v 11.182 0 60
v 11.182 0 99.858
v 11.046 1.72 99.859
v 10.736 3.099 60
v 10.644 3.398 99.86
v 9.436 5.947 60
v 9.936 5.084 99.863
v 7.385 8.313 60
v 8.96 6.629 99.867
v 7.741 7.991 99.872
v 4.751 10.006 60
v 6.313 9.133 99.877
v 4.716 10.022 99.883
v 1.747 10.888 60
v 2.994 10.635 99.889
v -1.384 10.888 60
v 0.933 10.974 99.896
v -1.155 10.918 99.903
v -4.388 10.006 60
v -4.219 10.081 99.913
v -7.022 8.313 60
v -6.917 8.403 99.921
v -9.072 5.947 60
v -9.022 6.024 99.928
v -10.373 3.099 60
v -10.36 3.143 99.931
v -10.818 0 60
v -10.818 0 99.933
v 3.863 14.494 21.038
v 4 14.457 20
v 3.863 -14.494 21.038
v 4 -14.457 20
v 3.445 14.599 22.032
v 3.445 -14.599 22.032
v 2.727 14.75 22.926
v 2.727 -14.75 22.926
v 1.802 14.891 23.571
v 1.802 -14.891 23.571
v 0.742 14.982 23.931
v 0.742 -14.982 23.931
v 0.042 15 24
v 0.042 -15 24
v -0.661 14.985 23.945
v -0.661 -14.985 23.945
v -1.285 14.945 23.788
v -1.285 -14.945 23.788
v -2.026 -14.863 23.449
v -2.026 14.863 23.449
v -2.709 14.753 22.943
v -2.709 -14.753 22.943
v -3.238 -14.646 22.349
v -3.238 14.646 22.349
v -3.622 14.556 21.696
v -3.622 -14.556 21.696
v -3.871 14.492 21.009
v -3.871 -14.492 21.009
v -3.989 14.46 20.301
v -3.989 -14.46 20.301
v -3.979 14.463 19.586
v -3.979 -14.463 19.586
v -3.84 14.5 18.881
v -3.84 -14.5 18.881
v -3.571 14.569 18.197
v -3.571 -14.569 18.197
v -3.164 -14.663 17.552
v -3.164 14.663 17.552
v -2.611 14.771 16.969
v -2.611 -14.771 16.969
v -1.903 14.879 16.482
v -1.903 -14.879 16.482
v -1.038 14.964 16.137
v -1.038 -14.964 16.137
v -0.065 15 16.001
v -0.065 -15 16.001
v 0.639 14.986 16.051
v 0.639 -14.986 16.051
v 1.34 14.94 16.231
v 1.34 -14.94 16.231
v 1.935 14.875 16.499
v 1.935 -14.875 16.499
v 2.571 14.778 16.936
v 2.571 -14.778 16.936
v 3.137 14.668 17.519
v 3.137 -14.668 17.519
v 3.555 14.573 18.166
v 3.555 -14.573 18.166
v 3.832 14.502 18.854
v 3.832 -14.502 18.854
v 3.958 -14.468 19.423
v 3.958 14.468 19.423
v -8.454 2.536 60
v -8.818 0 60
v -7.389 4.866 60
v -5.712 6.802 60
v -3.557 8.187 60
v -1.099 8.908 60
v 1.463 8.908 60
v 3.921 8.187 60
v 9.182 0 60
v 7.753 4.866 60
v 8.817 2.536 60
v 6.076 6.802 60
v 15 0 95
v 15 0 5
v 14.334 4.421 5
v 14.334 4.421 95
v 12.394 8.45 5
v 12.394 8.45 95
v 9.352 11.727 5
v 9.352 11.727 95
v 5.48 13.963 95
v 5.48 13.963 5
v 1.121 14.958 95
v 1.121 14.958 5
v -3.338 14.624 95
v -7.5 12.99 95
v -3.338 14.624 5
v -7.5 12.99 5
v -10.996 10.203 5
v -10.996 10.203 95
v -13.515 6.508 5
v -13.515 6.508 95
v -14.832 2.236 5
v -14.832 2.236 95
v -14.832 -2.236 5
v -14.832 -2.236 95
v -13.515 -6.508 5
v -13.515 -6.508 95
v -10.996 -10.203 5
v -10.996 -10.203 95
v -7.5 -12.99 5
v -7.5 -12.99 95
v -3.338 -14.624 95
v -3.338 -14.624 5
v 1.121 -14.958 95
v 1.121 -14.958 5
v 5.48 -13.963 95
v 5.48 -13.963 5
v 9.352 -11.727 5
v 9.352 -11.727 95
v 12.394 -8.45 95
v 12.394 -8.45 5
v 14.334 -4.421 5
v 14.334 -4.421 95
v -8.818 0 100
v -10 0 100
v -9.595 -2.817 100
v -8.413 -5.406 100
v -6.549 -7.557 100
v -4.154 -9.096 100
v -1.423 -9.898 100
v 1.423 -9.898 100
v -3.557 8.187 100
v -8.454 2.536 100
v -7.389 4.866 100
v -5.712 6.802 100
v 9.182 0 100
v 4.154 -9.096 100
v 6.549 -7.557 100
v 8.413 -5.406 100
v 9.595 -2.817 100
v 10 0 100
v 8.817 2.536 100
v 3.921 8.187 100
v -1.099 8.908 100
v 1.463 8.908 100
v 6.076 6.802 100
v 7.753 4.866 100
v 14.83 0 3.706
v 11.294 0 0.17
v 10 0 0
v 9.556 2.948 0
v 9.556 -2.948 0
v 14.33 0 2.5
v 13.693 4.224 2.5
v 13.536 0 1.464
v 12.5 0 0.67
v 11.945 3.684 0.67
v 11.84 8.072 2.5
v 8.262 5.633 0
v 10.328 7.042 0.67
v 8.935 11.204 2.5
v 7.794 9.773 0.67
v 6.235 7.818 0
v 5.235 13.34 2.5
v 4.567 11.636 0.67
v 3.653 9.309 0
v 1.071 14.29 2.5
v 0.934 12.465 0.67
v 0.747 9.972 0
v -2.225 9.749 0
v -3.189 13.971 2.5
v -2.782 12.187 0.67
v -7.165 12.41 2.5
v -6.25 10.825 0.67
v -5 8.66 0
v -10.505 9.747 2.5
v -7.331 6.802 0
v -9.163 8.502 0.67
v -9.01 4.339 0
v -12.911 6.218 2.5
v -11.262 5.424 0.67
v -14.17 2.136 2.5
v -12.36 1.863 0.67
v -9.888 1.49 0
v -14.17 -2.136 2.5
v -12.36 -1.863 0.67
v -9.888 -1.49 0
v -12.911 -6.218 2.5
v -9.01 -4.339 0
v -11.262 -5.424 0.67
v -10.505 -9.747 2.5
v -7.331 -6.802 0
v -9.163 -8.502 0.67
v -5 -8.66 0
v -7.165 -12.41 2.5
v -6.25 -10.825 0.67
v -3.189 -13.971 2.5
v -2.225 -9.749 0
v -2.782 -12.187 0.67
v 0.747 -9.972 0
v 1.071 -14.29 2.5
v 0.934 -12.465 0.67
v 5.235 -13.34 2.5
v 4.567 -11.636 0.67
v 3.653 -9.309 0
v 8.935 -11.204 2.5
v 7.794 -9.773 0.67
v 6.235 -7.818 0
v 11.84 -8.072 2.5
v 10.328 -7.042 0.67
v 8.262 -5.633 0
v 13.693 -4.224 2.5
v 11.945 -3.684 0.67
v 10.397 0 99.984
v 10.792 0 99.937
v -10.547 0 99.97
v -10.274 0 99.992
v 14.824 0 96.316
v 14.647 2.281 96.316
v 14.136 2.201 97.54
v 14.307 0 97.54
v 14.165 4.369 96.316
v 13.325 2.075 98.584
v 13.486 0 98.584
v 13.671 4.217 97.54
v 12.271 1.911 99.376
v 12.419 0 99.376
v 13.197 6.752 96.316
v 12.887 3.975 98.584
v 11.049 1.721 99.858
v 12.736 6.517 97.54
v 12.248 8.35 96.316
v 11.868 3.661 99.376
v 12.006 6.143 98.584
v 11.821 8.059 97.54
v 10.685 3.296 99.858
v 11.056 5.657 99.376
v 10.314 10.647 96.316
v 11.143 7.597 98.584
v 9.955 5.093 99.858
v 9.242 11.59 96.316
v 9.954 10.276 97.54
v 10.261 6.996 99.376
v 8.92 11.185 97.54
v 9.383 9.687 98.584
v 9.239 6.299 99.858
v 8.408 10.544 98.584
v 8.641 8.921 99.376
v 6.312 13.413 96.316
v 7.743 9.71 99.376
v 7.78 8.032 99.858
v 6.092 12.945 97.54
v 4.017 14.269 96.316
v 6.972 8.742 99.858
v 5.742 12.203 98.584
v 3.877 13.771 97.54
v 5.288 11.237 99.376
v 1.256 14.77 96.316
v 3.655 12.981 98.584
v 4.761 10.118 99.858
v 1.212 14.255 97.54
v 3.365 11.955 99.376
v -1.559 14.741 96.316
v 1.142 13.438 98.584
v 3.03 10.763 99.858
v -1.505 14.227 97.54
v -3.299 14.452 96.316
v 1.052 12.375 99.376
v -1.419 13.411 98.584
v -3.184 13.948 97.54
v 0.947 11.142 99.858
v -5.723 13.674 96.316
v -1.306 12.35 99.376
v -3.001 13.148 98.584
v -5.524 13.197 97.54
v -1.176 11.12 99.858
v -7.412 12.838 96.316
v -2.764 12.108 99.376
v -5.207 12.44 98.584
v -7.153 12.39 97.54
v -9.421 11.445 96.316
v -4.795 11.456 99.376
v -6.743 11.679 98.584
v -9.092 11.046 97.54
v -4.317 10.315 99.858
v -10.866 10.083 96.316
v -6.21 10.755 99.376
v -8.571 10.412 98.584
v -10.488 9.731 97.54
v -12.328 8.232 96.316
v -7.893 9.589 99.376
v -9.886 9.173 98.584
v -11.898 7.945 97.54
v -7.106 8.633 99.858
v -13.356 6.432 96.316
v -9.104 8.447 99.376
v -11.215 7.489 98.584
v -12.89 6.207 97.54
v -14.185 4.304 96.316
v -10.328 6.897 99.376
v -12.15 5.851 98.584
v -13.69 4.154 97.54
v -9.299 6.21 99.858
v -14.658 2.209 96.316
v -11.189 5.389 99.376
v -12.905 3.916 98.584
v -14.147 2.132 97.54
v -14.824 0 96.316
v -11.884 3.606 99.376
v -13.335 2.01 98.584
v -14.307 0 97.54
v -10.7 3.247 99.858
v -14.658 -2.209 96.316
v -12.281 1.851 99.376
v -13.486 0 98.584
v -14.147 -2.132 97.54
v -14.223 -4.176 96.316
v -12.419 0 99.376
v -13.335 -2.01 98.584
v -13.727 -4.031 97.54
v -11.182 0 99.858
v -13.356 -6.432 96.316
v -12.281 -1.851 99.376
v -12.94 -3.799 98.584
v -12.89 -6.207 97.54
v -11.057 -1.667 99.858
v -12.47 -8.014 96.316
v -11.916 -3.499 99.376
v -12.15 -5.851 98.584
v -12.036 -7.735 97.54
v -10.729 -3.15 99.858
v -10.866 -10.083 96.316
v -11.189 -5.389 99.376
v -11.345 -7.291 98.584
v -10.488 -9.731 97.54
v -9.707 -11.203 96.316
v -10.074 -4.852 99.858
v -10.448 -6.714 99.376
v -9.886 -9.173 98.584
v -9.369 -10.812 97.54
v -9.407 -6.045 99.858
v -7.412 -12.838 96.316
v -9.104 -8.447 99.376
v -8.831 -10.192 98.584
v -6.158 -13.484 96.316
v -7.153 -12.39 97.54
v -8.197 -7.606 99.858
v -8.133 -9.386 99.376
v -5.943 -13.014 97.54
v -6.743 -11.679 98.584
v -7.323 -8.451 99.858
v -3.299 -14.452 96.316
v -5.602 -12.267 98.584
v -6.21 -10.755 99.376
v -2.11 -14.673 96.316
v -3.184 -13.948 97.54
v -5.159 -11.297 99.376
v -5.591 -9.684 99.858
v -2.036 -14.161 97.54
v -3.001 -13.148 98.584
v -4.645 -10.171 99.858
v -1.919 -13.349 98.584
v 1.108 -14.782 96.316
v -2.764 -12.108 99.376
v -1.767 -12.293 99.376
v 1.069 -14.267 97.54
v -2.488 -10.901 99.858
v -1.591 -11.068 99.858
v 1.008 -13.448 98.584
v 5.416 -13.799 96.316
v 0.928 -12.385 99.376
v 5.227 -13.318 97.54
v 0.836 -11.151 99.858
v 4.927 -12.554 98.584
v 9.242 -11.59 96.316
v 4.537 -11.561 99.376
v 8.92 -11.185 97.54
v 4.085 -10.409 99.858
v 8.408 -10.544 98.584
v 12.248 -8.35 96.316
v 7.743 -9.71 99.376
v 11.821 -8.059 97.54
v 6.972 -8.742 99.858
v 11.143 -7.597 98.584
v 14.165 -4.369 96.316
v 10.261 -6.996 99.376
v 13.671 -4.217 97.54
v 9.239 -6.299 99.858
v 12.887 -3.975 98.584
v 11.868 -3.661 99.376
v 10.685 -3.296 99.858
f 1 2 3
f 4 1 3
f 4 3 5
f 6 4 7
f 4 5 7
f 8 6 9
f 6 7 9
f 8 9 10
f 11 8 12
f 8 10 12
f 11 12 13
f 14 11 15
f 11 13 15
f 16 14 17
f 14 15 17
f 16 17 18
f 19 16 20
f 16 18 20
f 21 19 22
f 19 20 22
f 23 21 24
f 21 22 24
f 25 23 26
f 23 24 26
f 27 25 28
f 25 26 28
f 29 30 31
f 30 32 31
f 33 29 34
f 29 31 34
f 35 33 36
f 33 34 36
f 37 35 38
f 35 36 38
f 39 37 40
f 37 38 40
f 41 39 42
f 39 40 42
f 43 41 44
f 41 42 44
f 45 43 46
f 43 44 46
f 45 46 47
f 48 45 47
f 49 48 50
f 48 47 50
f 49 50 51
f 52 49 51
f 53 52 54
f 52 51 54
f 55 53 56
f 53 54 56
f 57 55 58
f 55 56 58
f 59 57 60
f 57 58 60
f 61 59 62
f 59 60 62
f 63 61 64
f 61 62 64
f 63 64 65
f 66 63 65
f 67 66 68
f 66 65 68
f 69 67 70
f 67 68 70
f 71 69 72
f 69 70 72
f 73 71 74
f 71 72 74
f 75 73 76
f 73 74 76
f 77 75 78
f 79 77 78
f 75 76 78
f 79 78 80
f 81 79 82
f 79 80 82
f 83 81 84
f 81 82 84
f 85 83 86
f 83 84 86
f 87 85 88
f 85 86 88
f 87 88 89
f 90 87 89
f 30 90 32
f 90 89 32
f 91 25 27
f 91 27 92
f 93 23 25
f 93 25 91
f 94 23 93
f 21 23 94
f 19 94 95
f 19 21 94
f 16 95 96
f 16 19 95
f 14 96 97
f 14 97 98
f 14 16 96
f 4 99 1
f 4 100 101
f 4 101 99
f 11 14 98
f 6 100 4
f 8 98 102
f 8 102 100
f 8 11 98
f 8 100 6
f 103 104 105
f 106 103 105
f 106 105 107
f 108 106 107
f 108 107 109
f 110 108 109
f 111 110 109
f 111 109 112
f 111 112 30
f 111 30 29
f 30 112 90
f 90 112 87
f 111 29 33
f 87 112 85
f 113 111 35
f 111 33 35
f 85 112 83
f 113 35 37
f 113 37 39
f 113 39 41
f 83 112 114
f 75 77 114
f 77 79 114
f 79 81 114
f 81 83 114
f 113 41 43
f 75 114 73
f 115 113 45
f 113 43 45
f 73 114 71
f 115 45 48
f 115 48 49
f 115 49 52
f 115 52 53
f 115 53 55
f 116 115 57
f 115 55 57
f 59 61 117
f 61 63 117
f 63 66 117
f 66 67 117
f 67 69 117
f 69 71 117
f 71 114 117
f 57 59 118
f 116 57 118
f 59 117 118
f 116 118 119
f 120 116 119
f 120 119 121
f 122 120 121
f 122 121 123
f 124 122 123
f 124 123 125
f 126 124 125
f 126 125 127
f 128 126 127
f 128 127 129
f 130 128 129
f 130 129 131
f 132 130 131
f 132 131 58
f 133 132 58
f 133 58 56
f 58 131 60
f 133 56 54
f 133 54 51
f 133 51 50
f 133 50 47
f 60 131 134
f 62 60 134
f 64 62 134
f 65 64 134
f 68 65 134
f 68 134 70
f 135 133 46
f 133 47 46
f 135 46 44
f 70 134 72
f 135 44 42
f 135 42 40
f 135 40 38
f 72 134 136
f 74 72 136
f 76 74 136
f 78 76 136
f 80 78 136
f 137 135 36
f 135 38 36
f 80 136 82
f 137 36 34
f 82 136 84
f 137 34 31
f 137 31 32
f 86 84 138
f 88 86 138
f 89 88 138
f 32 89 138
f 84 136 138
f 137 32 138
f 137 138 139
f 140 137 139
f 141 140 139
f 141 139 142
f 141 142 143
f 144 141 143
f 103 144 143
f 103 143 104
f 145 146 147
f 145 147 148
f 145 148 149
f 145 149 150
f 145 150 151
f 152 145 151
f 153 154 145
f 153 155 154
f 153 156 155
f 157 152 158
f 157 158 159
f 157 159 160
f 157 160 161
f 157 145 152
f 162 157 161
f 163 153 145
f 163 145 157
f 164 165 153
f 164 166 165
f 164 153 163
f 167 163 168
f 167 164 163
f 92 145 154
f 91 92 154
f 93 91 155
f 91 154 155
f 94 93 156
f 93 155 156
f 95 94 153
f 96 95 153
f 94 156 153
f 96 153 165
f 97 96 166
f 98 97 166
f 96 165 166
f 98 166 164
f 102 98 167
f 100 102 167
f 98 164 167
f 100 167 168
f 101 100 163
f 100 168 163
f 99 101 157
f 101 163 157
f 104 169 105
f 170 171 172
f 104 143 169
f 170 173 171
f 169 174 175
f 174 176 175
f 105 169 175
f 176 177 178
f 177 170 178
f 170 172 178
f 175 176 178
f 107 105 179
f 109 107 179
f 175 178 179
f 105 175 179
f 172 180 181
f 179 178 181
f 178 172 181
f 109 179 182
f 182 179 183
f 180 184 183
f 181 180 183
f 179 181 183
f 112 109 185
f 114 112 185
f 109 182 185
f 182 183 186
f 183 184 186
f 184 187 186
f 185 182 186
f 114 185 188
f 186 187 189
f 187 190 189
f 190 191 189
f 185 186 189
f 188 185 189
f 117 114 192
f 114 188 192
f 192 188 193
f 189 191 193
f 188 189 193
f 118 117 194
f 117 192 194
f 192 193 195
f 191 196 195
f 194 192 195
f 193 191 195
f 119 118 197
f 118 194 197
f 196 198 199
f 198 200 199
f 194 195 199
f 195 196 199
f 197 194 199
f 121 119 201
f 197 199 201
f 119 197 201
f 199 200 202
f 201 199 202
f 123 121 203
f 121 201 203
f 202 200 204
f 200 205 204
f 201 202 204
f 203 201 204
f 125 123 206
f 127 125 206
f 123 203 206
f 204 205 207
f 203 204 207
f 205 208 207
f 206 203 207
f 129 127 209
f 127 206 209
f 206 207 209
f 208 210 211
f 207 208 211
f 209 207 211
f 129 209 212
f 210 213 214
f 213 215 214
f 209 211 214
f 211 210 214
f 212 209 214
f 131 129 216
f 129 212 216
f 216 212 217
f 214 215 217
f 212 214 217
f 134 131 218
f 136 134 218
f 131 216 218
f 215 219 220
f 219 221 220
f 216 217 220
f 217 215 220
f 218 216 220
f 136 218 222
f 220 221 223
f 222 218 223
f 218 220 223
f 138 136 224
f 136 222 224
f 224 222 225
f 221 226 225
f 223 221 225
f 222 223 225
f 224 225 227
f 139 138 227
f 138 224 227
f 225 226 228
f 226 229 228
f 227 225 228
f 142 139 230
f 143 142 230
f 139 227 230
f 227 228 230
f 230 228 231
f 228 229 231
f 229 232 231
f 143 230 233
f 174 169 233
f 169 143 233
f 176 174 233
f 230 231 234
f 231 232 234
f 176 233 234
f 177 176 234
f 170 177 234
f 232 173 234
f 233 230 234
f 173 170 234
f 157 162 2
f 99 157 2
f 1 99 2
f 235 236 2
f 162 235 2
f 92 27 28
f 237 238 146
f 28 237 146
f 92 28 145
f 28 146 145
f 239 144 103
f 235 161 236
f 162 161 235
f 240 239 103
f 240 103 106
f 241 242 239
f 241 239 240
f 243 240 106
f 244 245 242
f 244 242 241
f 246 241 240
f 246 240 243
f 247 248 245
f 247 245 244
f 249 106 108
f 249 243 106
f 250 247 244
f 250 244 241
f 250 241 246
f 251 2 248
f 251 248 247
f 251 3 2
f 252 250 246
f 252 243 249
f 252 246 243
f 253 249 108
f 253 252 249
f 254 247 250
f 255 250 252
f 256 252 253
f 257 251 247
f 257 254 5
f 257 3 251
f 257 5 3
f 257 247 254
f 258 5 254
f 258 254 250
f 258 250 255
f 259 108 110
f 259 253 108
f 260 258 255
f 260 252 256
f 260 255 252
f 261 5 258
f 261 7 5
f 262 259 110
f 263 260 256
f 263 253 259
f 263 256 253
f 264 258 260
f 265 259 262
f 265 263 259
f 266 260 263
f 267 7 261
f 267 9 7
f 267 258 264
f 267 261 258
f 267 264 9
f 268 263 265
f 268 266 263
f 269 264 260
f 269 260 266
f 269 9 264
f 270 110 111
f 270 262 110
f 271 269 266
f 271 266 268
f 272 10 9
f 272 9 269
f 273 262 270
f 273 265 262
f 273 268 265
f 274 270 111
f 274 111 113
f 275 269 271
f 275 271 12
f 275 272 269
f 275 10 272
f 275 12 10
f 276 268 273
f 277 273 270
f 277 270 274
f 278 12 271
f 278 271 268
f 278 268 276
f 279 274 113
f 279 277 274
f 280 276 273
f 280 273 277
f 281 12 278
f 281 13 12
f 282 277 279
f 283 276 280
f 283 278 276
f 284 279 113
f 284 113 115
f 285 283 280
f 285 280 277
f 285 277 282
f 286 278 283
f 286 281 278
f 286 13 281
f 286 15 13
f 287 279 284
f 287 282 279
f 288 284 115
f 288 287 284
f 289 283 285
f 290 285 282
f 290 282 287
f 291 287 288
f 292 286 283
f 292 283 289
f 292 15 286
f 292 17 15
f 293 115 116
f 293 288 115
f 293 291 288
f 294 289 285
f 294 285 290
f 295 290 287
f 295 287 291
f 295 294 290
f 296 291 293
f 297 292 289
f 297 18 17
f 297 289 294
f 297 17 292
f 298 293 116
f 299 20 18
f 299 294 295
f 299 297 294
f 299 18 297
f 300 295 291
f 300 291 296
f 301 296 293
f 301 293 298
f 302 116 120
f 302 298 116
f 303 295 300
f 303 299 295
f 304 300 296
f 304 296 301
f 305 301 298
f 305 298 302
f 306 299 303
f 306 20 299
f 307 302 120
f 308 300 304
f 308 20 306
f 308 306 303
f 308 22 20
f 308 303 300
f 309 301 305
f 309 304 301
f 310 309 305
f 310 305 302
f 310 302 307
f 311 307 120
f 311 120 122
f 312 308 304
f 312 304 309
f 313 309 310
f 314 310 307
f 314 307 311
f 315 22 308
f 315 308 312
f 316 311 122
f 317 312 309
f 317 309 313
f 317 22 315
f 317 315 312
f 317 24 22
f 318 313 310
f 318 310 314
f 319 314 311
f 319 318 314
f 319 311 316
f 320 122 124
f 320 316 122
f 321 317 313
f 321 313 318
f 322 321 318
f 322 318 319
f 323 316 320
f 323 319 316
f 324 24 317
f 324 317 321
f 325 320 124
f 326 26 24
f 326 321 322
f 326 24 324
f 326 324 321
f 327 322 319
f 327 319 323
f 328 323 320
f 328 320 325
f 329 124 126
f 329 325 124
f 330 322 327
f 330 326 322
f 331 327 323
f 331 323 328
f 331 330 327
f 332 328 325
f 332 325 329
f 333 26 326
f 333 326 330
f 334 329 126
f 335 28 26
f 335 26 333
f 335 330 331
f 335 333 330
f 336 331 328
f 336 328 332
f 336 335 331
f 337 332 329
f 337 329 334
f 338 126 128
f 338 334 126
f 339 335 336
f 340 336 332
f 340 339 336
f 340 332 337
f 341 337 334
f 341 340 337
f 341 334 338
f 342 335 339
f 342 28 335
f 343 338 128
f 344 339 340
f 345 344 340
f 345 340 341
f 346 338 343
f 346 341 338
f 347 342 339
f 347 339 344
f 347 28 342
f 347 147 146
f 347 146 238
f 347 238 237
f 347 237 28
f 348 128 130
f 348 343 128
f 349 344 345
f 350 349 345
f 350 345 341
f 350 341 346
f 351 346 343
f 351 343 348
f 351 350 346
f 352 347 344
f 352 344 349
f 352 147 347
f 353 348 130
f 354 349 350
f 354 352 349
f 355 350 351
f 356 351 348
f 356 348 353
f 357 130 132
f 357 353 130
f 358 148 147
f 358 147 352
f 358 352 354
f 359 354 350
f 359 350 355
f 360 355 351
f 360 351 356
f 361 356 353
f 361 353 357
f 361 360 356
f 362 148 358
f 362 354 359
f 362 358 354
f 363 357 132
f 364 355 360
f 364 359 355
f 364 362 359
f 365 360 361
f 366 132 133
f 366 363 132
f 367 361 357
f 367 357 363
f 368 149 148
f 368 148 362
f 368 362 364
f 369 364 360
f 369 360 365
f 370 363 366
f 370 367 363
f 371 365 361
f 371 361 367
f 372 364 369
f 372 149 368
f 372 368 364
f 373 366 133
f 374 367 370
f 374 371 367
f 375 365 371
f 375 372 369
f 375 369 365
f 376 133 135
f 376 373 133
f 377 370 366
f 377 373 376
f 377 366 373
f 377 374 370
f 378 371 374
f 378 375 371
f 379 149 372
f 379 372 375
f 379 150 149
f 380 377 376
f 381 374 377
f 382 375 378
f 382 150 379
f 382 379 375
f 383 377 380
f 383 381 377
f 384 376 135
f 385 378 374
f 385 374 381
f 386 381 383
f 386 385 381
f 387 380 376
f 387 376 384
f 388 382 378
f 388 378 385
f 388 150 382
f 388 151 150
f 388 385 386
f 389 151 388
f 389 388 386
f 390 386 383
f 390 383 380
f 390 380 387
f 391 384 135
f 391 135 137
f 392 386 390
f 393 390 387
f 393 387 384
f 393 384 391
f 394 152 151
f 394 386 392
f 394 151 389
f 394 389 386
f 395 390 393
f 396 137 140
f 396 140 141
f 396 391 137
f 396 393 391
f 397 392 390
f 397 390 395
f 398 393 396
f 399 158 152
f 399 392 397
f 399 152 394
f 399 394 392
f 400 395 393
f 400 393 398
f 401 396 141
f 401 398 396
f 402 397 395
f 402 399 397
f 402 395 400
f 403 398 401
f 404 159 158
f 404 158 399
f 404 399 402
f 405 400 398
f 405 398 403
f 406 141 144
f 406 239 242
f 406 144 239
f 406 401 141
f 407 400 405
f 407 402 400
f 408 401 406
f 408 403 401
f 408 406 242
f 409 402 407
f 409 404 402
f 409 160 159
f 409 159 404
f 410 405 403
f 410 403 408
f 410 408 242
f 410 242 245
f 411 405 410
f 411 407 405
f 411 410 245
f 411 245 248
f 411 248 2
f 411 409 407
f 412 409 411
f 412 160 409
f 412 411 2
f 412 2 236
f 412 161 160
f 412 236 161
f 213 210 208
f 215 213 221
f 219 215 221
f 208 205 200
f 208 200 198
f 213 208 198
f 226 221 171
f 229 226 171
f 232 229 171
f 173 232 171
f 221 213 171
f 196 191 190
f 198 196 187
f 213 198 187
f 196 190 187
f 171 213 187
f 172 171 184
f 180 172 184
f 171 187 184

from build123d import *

# Parameters (mm, degrees)
F0_R          = 15
F1_DEPTH      = 100
F3_DEPTH      = 40
F5_R          = 4
F6_DEPTH      = 25
F6_DEPTH_BACK = 25


# Not quite as in the source:
# - a fillet or chamfer that OpenCascade refuses, or shapes differently, is made with other operations: its cross-section is extruded or revolved along the edge and cut away or added


with BuildPart() as f1:
    # F0 (on Top) → F1 (new body)
    with BuildSketch(Plane.XY):
        Circle(F0_R)
    extrude(amount=F1_DEPTH)

    # F2 (on face) → F3 (cut)
    with BuildSketch(Plane.XY.offset(100)):
        with BuildLine():
            Line((9.1818189363, 0), (11.1818189363, 0))
            ThreePointArc((11.1818189363, 0), (0.1818189363, 11), (-10.8181810637, 0))
            Line((-10.8181810637, 0), (-8.8181810637, 0))
            ThreePointArc((-8.8181810637, 0), (0.1818189363, 9), (9.1818189363, 0))
        make_face()
    extrude(amount=-F3_DEPTH, mode=Mode.SUBTRACT)

    # F4: fillet of radius 5 on 2 edges, made by hand

    # F4_s1 → F4_t2 (revolve, cut)
    with BuildSketch(Plane.XZ):
        with BuildLine():
            ThreePointArc((15, 95), (13.5355339059, 98.5355339059), (10, 100))
            Line((10, 100), (15, 100))
            Line((15, 100), (15, 95))
        make_face()
    revolve(axis=Axis((0, 0, 100), (0, 0, 1)), mode=Mode.SUBTRACT)

    # F4_s3 → F4_t4 (revolve, cut)
    with BuildSketch(Plane.XZ):
        with BuildLine():
            ThreePointArc((15, 5), (13.5355339059, 1.4644660941), (10, 0))
            Line((10, 0), (15, 0))
            Line((15, 0), (15, 5))
        make_face()
    revolve(axis=Axis((0, 0, 0), (0, 0, 1)), mode=Mode.SUBTRACT)

    # F5 (on Front) → F6 (cut, two sides)
    with BuildSketch(Plane.XZ) as f6_sk:
        with Locations((0, 20)):
            Circle(F5_R)
    extrude(amount=-F6_DEPTH, mode=Mode.SUBTRACT)
    extrude(f6_sk.sketch, amount=F6_DEPTH_BACK, mode=Mode.SUBTRACT)


solid = f1.part
